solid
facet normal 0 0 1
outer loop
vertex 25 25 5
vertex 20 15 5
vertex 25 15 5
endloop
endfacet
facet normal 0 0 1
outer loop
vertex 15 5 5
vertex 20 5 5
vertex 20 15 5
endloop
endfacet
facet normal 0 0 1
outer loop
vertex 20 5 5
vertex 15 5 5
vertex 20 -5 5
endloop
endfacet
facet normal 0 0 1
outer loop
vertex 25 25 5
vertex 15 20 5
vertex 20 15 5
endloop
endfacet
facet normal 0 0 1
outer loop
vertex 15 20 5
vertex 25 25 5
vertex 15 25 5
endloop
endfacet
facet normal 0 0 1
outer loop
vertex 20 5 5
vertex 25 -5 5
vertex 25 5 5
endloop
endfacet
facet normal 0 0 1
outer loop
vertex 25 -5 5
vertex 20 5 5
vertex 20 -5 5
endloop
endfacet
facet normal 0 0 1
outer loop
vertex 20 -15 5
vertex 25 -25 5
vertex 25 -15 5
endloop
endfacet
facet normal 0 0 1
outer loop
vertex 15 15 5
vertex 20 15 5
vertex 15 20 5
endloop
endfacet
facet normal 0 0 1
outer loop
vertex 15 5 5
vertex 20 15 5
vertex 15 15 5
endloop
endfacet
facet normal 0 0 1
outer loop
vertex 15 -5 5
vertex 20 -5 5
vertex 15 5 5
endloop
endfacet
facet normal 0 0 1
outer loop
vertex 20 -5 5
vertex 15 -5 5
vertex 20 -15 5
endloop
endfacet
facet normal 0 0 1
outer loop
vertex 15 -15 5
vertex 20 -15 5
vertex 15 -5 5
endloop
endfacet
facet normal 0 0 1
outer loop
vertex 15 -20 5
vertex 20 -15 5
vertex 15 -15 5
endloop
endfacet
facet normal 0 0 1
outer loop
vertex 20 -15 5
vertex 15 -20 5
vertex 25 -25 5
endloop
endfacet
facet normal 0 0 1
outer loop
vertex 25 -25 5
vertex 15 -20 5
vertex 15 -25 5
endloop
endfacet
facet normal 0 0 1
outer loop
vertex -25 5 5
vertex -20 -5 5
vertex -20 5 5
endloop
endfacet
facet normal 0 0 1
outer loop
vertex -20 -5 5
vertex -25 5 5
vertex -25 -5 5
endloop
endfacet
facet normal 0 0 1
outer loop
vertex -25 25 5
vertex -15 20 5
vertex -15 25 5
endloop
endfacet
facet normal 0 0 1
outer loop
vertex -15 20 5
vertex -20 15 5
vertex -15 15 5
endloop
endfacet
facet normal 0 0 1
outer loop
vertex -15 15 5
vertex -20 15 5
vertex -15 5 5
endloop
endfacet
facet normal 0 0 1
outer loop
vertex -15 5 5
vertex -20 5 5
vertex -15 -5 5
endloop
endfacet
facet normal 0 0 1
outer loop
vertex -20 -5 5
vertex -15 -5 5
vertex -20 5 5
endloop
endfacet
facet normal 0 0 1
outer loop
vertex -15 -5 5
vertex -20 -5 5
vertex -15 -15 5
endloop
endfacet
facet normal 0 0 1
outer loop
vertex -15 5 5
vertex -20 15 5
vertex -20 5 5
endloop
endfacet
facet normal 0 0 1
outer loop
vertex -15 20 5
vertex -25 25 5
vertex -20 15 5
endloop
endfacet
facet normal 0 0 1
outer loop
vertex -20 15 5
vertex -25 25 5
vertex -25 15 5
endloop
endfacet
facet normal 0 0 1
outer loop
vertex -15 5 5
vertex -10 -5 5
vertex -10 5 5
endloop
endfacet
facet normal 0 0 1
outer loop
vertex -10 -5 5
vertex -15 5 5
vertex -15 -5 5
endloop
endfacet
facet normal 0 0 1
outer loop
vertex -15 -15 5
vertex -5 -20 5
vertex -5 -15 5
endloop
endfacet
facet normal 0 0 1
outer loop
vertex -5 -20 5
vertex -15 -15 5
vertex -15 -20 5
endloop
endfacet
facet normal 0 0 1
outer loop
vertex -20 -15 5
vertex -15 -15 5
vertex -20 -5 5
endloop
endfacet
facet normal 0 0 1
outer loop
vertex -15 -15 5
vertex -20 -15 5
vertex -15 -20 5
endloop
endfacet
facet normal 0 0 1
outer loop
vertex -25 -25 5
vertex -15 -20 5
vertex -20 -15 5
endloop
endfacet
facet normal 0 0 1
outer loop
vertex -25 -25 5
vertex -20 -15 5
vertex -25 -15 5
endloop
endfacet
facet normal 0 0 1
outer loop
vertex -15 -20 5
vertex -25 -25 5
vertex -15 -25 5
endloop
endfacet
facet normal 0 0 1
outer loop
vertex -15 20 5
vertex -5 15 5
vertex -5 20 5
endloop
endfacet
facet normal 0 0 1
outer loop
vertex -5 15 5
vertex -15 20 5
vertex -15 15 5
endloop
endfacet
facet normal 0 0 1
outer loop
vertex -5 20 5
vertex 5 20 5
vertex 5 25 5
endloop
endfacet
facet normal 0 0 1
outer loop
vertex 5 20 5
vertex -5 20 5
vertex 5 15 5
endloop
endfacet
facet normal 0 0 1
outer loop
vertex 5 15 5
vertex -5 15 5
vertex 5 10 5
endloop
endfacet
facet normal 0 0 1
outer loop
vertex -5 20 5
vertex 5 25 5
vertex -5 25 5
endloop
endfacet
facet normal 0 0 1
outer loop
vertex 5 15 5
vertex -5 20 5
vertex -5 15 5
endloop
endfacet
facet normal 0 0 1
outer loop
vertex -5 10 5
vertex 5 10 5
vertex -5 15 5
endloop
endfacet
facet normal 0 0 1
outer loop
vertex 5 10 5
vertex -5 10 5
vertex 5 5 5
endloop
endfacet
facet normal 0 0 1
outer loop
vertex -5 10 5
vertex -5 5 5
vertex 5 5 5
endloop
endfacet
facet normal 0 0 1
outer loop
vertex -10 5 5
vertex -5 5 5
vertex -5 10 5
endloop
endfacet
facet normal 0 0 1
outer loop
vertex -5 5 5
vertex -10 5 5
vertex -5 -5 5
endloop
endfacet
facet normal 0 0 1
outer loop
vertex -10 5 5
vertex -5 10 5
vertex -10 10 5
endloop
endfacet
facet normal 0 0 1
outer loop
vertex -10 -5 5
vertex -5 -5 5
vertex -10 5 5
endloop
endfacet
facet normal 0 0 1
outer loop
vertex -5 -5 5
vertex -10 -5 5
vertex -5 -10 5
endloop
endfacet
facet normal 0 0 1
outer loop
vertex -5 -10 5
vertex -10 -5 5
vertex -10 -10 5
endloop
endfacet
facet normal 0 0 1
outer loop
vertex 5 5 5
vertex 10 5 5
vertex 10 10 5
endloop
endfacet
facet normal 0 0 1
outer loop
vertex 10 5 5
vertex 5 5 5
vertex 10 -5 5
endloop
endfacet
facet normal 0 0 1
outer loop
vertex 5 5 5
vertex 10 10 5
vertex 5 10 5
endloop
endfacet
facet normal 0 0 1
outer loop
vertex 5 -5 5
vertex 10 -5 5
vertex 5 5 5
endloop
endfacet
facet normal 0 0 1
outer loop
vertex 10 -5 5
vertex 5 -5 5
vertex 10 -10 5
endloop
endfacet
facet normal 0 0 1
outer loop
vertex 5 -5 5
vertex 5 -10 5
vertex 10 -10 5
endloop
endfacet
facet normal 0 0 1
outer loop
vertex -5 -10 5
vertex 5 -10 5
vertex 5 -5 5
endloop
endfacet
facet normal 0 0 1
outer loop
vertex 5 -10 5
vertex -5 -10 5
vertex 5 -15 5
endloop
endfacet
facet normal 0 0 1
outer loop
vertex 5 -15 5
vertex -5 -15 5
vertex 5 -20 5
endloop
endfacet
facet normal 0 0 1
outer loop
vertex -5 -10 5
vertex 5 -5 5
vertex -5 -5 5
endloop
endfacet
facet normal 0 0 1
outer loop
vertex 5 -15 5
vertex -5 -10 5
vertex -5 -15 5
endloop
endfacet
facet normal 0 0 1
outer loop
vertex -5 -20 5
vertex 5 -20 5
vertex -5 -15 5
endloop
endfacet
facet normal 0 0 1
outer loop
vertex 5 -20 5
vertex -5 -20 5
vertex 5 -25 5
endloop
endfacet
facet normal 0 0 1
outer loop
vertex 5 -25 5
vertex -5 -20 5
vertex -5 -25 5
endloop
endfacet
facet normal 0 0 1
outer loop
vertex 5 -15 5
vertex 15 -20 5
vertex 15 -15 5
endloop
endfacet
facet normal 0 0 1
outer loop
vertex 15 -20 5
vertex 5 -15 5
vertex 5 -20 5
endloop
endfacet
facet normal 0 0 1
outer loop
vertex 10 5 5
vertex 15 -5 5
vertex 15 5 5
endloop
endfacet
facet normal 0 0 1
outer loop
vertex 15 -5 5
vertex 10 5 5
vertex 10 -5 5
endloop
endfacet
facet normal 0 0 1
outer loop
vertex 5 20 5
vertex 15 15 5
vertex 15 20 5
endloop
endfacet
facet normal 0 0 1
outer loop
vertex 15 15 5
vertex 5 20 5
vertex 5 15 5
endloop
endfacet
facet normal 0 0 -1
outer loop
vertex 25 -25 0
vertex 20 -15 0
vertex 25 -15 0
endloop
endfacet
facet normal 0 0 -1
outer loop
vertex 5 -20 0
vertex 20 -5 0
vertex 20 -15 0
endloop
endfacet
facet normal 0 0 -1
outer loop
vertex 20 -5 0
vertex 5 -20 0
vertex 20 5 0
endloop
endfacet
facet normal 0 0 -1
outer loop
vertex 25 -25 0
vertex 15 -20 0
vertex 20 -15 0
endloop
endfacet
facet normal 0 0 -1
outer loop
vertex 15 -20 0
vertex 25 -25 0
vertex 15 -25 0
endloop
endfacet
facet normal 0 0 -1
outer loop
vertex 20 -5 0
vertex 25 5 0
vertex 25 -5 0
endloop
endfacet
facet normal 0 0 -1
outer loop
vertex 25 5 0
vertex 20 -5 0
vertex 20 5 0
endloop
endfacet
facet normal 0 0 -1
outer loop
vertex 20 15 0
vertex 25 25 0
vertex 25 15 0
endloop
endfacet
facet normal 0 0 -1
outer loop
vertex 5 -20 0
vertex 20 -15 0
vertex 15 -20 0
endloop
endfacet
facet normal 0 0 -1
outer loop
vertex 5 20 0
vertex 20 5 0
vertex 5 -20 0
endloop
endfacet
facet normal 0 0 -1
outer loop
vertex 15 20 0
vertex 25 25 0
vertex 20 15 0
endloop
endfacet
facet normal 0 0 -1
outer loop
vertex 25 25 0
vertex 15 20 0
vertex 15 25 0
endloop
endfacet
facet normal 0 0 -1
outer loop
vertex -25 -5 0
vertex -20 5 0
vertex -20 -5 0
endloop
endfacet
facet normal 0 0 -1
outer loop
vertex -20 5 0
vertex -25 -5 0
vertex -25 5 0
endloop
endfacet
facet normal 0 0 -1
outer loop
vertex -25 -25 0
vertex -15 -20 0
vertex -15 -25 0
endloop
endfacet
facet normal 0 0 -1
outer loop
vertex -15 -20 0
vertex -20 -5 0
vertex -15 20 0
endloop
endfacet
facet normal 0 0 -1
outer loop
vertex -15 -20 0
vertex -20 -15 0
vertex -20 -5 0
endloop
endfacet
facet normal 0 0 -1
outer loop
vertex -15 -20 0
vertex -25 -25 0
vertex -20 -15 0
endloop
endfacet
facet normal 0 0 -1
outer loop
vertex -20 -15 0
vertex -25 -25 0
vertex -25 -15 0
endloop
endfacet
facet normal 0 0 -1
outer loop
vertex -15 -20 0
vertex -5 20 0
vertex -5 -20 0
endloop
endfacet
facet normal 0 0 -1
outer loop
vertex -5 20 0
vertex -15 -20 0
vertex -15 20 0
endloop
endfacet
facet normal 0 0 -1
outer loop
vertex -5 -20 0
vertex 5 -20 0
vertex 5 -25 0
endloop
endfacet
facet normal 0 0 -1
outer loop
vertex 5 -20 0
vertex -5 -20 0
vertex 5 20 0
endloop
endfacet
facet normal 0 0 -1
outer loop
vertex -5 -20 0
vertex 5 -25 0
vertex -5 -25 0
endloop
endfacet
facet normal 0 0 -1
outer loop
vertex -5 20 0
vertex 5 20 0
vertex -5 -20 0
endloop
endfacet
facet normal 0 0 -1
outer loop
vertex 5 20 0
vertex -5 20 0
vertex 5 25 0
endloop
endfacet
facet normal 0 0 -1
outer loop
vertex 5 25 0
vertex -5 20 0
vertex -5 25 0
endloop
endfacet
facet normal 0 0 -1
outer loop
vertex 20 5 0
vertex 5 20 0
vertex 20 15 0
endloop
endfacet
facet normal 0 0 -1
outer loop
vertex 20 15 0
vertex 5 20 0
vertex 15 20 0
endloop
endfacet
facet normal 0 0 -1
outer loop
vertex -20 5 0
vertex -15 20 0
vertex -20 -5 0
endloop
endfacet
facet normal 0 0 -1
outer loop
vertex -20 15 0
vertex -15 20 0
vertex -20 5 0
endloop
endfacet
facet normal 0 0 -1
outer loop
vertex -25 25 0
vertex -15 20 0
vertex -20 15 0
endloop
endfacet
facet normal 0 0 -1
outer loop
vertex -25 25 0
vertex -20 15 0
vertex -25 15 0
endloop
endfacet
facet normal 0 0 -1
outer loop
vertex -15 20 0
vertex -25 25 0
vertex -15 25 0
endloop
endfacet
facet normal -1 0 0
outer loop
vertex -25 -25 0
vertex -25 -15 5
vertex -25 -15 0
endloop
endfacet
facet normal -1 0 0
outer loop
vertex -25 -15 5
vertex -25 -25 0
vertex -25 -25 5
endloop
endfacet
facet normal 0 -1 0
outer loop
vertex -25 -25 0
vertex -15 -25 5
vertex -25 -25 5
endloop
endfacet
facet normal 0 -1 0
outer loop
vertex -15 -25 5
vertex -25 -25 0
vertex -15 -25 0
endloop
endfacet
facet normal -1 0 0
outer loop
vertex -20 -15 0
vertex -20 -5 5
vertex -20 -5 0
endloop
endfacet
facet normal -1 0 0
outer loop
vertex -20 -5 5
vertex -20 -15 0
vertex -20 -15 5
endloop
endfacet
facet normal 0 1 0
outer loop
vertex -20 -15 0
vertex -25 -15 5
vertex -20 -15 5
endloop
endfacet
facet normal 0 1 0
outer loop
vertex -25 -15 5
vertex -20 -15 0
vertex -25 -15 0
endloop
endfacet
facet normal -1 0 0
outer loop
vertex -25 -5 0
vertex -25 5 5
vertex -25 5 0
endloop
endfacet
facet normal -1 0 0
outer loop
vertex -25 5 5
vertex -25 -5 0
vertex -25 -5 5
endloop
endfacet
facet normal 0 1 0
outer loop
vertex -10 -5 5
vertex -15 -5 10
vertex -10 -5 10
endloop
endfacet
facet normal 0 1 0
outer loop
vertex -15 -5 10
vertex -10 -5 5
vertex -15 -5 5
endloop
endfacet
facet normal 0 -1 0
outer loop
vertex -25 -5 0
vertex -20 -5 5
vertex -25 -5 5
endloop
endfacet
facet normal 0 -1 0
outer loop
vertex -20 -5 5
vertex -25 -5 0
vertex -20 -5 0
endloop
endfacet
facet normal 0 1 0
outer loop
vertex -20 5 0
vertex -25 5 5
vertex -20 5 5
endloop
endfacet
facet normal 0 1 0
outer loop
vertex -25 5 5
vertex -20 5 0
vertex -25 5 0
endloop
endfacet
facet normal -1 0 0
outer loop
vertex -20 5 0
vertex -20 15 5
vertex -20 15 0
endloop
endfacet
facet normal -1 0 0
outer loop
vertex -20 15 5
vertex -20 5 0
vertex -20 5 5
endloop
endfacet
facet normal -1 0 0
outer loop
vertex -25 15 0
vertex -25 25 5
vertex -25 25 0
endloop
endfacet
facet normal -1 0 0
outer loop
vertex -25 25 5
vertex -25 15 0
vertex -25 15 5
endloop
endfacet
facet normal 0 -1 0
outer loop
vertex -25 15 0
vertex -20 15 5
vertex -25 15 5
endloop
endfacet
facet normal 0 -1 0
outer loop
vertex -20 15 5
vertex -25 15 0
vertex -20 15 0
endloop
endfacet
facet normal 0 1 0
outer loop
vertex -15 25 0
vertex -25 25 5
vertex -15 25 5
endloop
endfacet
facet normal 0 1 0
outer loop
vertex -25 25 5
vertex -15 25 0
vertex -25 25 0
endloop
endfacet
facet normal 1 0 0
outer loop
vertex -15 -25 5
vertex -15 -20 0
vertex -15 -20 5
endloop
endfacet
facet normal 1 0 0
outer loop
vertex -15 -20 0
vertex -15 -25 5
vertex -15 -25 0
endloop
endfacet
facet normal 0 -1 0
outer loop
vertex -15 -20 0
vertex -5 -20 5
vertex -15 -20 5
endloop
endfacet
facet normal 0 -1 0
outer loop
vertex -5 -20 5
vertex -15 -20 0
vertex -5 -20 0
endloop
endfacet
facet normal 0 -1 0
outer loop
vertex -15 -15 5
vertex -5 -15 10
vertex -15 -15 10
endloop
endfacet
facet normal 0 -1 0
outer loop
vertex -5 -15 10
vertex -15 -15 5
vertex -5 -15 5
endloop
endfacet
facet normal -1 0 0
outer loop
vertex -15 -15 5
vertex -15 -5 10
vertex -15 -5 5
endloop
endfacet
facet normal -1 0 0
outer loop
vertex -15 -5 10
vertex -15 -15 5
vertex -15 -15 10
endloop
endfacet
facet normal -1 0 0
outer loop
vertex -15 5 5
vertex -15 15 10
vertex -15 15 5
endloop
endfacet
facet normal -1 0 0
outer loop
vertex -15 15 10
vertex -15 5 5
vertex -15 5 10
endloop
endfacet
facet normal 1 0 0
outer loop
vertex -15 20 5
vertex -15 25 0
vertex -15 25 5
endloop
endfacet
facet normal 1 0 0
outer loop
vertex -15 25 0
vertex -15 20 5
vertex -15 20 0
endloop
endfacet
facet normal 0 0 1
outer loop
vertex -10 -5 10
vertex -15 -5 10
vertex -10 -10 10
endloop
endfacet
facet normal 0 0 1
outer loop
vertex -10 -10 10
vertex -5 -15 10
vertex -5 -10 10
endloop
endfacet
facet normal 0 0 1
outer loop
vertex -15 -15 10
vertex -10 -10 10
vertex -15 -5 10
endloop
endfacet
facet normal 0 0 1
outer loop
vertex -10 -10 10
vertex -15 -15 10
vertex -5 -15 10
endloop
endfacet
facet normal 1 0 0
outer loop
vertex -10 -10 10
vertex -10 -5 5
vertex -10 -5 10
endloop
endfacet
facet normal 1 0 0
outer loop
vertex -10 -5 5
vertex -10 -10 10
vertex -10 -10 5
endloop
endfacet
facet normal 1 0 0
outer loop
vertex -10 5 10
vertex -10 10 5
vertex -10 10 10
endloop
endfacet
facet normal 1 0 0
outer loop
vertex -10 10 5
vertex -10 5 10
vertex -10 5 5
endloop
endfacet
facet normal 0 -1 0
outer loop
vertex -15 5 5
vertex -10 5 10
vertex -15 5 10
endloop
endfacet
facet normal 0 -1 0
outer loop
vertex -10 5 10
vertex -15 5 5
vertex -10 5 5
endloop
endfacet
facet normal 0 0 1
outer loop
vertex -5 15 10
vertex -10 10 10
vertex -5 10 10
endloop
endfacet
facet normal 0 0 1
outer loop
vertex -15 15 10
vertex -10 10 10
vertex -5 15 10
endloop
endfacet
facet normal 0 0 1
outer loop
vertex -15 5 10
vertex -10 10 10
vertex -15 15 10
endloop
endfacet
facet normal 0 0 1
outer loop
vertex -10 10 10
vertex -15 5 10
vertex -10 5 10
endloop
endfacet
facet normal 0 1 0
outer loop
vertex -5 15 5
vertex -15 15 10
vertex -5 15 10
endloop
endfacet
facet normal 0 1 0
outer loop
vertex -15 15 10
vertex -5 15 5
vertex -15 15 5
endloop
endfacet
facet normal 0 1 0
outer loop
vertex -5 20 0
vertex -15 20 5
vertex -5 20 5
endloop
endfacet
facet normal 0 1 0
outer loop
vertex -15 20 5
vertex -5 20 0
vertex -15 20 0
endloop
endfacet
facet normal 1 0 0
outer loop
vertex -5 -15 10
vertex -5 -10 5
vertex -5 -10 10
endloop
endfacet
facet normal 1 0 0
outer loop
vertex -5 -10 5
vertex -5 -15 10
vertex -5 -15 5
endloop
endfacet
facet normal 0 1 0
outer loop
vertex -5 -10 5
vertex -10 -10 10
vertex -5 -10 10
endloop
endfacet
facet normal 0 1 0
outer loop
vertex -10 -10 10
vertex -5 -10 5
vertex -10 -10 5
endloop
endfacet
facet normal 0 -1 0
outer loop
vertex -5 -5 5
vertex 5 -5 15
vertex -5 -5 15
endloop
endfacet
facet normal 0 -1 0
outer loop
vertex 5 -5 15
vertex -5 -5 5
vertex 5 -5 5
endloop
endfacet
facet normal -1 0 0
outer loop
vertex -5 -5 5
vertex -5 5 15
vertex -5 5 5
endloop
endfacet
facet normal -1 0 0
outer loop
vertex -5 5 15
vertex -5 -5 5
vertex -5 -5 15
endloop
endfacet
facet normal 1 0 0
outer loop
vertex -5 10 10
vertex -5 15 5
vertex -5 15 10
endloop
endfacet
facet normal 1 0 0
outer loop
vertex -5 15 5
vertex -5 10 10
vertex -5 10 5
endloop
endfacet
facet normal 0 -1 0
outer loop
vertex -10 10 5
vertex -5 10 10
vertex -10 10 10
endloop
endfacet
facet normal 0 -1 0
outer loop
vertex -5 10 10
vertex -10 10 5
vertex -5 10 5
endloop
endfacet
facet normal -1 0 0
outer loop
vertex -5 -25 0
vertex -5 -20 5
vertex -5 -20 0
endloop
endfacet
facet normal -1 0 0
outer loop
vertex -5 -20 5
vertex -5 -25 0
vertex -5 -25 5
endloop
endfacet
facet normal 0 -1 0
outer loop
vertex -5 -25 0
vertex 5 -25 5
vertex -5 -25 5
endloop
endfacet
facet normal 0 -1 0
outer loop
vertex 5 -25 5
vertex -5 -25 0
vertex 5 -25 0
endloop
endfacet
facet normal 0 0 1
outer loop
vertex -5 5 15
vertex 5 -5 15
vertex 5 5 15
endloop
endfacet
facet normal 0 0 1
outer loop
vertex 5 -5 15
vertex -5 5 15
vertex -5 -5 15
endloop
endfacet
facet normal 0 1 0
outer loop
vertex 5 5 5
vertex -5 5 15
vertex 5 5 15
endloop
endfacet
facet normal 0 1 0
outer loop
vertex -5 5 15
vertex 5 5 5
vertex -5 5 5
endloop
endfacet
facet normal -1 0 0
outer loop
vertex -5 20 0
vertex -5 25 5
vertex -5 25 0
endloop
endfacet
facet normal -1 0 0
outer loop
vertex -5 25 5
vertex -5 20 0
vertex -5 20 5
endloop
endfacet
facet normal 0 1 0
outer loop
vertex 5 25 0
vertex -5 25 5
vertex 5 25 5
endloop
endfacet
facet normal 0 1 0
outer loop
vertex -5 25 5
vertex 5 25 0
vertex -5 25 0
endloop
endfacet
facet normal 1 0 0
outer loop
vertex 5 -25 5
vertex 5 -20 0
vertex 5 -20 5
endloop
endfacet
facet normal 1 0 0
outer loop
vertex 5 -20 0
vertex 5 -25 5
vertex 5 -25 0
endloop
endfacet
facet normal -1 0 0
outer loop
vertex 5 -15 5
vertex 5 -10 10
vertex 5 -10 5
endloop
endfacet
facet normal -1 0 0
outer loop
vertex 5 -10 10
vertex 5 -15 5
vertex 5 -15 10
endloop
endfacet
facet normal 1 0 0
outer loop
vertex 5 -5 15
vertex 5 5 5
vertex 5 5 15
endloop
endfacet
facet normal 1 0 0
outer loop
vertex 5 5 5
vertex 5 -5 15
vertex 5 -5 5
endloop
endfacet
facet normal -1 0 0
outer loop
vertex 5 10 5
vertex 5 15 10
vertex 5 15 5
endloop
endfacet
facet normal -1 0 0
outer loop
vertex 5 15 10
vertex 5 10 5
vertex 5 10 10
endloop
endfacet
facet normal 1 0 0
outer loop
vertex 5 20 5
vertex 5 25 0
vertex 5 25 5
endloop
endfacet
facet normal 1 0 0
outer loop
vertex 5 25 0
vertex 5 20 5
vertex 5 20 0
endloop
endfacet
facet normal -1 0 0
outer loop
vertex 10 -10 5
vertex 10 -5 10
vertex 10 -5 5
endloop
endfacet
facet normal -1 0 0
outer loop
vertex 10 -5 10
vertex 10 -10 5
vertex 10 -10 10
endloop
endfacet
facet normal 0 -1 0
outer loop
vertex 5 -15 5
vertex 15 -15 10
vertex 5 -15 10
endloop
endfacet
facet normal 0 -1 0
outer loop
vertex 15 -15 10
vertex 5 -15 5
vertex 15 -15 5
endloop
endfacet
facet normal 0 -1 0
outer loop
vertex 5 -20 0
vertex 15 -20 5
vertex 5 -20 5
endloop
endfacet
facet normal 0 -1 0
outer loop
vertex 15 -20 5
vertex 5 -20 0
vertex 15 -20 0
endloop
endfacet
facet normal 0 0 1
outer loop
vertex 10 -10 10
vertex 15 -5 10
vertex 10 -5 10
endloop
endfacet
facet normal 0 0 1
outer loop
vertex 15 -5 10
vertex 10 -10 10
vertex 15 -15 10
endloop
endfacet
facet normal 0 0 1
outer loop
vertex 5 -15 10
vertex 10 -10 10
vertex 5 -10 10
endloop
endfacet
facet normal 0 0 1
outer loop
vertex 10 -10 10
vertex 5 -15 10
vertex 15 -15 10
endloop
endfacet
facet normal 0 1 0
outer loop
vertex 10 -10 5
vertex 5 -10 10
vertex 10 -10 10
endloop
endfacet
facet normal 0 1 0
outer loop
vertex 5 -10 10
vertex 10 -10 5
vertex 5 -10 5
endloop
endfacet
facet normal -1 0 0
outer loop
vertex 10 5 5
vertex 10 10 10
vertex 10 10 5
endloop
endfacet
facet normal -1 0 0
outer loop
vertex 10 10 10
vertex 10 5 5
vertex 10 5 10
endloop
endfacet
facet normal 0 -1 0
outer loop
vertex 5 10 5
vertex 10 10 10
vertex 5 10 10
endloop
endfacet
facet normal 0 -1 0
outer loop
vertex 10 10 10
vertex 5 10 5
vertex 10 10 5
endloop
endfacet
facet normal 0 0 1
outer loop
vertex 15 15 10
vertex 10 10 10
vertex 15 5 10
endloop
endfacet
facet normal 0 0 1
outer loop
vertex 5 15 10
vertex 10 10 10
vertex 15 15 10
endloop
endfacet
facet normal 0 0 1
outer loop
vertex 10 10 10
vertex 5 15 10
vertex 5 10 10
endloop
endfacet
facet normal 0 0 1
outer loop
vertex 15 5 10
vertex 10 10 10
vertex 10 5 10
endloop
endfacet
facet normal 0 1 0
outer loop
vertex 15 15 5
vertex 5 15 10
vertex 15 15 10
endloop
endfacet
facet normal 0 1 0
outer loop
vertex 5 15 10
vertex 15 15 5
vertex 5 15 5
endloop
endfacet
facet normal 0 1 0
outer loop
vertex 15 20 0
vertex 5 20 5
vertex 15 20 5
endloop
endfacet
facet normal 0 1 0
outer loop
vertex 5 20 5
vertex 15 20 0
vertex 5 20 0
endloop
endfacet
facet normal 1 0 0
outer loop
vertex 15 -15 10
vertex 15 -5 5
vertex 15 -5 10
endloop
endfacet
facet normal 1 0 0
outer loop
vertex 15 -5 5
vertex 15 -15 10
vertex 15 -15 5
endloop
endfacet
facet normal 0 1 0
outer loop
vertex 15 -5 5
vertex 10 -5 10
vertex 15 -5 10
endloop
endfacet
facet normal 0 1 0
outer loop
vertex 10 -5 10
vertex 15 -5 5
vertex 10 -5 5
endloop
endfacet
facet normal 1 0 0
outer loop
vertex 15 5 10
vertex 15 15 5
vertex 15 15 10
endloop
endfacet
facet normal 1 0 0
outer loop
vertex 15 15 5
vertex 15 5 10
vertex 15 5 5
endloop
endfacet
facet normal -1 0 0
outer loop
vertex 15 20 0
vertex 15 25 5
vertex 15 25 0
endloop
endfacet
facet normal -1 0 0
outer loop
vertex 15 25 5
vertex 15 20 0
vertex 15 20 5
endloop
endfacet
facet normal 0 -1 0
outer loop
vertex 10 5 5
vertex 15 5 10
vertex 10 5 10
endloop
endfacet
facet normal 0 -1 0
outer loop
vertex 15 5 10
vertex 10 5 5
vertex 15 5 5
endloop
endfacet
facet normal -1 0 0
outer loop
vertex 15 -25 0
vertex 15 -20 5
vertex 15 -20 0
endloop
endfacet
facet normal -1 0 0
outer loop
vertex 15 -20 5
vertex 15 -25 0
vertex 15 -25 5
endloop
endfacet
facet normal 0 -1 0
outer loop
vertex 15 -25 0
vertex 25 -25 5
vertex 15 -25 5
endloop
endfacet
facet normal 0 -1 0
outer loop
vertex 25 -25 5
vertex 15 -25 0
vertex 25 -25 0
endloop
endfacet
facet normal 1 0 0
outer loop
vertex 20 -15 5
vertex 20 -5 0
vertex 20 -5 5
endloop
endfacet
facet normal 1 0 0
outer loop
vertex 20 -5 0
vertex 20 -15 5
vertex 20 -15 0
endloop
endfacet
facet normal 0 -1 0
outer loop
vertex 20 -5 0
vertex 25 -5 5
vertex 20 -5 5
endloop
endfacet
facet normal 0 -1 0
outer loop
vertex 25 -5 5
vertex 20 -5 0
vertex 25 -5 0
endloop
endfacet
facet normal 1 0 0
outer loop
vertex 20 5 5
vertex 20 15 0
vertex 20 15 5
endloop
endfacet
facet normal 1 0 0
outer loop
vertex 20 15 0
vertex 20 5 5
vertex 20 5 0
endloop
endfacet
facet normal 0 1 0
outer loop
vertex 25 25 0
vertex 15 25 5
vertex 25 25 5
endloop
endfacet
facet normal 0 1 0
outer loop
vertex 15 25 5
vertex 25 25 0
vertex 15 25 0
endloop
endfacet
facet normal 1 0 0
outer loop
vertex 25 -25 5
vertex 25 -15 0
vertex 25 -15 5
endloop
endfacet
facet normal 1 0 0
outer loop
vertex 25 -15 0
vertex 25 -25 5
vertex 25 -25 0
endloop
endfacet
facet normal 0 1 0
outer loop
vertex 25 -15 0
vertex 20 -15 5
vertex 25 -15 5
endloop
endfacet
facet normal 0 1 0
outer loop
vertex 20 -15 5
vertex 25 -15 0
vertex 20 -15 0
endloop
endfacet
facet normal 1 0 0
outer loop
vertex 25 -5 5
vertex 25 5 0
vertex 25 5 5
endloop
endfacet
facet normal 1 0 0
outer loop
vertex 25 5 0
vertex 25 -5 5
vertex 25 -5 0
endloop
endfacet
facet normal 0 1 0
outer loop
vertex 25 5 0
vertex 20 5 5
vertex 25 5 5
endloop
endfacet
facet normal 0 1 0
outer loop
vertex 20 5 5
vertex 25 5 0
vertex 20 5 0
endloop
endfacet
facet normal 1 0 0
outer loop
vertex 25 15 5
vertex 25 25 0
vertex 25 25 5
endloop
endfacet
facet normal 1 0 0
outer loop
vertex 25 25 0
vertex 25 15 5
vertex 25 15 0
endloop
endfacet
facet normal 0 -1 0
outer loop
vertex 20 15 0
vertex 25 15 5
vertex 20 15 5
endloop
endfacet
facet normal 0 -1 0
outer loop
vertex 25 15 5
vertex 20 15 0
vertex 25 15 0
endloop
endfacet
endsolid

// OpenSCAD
/*
Height Map Example
Tony Buser <tbuser@gmail.com>
http://tonybuser.com
http://creativecommons.org/licenses/by/3.0/

Can also dynamically run this by passing an array on the command line:

/Applications/OpenSCAD.app/Contents/MacOS/OpenSCAD -m make -D bitmap=[2,2,2,0,1,3,2,2,2] -D row_size=3 -s height_map.stl height_map.scad
*/

use <bitmap.scad>

block_size = 5;
height = 5;

row_size = 10; // 10x10 pixels
bitmap = [
	1,1,0,0,1,1,0,0,1,1,
	1,1,1,1,1,1,1,1,1,1,
	0,1,2,2,1,1,2,2,1,0,
	0,1,2,1,1,1,1,2,1,0,
	1,1,1,1,3,3,1,1,1,1,
	1,1,1,1,3,3,1,1,1,1,
	0,1,2,1,1,1,1,2,1,0,
	0,1,2,2,1,1,2,2,1,0,
	1,1,1,1,1,1,1,1,1,1,
	1,1,0,0,1,1,0,0,1,1
];

bitmap(bitmap, block_size, height, row_size);
